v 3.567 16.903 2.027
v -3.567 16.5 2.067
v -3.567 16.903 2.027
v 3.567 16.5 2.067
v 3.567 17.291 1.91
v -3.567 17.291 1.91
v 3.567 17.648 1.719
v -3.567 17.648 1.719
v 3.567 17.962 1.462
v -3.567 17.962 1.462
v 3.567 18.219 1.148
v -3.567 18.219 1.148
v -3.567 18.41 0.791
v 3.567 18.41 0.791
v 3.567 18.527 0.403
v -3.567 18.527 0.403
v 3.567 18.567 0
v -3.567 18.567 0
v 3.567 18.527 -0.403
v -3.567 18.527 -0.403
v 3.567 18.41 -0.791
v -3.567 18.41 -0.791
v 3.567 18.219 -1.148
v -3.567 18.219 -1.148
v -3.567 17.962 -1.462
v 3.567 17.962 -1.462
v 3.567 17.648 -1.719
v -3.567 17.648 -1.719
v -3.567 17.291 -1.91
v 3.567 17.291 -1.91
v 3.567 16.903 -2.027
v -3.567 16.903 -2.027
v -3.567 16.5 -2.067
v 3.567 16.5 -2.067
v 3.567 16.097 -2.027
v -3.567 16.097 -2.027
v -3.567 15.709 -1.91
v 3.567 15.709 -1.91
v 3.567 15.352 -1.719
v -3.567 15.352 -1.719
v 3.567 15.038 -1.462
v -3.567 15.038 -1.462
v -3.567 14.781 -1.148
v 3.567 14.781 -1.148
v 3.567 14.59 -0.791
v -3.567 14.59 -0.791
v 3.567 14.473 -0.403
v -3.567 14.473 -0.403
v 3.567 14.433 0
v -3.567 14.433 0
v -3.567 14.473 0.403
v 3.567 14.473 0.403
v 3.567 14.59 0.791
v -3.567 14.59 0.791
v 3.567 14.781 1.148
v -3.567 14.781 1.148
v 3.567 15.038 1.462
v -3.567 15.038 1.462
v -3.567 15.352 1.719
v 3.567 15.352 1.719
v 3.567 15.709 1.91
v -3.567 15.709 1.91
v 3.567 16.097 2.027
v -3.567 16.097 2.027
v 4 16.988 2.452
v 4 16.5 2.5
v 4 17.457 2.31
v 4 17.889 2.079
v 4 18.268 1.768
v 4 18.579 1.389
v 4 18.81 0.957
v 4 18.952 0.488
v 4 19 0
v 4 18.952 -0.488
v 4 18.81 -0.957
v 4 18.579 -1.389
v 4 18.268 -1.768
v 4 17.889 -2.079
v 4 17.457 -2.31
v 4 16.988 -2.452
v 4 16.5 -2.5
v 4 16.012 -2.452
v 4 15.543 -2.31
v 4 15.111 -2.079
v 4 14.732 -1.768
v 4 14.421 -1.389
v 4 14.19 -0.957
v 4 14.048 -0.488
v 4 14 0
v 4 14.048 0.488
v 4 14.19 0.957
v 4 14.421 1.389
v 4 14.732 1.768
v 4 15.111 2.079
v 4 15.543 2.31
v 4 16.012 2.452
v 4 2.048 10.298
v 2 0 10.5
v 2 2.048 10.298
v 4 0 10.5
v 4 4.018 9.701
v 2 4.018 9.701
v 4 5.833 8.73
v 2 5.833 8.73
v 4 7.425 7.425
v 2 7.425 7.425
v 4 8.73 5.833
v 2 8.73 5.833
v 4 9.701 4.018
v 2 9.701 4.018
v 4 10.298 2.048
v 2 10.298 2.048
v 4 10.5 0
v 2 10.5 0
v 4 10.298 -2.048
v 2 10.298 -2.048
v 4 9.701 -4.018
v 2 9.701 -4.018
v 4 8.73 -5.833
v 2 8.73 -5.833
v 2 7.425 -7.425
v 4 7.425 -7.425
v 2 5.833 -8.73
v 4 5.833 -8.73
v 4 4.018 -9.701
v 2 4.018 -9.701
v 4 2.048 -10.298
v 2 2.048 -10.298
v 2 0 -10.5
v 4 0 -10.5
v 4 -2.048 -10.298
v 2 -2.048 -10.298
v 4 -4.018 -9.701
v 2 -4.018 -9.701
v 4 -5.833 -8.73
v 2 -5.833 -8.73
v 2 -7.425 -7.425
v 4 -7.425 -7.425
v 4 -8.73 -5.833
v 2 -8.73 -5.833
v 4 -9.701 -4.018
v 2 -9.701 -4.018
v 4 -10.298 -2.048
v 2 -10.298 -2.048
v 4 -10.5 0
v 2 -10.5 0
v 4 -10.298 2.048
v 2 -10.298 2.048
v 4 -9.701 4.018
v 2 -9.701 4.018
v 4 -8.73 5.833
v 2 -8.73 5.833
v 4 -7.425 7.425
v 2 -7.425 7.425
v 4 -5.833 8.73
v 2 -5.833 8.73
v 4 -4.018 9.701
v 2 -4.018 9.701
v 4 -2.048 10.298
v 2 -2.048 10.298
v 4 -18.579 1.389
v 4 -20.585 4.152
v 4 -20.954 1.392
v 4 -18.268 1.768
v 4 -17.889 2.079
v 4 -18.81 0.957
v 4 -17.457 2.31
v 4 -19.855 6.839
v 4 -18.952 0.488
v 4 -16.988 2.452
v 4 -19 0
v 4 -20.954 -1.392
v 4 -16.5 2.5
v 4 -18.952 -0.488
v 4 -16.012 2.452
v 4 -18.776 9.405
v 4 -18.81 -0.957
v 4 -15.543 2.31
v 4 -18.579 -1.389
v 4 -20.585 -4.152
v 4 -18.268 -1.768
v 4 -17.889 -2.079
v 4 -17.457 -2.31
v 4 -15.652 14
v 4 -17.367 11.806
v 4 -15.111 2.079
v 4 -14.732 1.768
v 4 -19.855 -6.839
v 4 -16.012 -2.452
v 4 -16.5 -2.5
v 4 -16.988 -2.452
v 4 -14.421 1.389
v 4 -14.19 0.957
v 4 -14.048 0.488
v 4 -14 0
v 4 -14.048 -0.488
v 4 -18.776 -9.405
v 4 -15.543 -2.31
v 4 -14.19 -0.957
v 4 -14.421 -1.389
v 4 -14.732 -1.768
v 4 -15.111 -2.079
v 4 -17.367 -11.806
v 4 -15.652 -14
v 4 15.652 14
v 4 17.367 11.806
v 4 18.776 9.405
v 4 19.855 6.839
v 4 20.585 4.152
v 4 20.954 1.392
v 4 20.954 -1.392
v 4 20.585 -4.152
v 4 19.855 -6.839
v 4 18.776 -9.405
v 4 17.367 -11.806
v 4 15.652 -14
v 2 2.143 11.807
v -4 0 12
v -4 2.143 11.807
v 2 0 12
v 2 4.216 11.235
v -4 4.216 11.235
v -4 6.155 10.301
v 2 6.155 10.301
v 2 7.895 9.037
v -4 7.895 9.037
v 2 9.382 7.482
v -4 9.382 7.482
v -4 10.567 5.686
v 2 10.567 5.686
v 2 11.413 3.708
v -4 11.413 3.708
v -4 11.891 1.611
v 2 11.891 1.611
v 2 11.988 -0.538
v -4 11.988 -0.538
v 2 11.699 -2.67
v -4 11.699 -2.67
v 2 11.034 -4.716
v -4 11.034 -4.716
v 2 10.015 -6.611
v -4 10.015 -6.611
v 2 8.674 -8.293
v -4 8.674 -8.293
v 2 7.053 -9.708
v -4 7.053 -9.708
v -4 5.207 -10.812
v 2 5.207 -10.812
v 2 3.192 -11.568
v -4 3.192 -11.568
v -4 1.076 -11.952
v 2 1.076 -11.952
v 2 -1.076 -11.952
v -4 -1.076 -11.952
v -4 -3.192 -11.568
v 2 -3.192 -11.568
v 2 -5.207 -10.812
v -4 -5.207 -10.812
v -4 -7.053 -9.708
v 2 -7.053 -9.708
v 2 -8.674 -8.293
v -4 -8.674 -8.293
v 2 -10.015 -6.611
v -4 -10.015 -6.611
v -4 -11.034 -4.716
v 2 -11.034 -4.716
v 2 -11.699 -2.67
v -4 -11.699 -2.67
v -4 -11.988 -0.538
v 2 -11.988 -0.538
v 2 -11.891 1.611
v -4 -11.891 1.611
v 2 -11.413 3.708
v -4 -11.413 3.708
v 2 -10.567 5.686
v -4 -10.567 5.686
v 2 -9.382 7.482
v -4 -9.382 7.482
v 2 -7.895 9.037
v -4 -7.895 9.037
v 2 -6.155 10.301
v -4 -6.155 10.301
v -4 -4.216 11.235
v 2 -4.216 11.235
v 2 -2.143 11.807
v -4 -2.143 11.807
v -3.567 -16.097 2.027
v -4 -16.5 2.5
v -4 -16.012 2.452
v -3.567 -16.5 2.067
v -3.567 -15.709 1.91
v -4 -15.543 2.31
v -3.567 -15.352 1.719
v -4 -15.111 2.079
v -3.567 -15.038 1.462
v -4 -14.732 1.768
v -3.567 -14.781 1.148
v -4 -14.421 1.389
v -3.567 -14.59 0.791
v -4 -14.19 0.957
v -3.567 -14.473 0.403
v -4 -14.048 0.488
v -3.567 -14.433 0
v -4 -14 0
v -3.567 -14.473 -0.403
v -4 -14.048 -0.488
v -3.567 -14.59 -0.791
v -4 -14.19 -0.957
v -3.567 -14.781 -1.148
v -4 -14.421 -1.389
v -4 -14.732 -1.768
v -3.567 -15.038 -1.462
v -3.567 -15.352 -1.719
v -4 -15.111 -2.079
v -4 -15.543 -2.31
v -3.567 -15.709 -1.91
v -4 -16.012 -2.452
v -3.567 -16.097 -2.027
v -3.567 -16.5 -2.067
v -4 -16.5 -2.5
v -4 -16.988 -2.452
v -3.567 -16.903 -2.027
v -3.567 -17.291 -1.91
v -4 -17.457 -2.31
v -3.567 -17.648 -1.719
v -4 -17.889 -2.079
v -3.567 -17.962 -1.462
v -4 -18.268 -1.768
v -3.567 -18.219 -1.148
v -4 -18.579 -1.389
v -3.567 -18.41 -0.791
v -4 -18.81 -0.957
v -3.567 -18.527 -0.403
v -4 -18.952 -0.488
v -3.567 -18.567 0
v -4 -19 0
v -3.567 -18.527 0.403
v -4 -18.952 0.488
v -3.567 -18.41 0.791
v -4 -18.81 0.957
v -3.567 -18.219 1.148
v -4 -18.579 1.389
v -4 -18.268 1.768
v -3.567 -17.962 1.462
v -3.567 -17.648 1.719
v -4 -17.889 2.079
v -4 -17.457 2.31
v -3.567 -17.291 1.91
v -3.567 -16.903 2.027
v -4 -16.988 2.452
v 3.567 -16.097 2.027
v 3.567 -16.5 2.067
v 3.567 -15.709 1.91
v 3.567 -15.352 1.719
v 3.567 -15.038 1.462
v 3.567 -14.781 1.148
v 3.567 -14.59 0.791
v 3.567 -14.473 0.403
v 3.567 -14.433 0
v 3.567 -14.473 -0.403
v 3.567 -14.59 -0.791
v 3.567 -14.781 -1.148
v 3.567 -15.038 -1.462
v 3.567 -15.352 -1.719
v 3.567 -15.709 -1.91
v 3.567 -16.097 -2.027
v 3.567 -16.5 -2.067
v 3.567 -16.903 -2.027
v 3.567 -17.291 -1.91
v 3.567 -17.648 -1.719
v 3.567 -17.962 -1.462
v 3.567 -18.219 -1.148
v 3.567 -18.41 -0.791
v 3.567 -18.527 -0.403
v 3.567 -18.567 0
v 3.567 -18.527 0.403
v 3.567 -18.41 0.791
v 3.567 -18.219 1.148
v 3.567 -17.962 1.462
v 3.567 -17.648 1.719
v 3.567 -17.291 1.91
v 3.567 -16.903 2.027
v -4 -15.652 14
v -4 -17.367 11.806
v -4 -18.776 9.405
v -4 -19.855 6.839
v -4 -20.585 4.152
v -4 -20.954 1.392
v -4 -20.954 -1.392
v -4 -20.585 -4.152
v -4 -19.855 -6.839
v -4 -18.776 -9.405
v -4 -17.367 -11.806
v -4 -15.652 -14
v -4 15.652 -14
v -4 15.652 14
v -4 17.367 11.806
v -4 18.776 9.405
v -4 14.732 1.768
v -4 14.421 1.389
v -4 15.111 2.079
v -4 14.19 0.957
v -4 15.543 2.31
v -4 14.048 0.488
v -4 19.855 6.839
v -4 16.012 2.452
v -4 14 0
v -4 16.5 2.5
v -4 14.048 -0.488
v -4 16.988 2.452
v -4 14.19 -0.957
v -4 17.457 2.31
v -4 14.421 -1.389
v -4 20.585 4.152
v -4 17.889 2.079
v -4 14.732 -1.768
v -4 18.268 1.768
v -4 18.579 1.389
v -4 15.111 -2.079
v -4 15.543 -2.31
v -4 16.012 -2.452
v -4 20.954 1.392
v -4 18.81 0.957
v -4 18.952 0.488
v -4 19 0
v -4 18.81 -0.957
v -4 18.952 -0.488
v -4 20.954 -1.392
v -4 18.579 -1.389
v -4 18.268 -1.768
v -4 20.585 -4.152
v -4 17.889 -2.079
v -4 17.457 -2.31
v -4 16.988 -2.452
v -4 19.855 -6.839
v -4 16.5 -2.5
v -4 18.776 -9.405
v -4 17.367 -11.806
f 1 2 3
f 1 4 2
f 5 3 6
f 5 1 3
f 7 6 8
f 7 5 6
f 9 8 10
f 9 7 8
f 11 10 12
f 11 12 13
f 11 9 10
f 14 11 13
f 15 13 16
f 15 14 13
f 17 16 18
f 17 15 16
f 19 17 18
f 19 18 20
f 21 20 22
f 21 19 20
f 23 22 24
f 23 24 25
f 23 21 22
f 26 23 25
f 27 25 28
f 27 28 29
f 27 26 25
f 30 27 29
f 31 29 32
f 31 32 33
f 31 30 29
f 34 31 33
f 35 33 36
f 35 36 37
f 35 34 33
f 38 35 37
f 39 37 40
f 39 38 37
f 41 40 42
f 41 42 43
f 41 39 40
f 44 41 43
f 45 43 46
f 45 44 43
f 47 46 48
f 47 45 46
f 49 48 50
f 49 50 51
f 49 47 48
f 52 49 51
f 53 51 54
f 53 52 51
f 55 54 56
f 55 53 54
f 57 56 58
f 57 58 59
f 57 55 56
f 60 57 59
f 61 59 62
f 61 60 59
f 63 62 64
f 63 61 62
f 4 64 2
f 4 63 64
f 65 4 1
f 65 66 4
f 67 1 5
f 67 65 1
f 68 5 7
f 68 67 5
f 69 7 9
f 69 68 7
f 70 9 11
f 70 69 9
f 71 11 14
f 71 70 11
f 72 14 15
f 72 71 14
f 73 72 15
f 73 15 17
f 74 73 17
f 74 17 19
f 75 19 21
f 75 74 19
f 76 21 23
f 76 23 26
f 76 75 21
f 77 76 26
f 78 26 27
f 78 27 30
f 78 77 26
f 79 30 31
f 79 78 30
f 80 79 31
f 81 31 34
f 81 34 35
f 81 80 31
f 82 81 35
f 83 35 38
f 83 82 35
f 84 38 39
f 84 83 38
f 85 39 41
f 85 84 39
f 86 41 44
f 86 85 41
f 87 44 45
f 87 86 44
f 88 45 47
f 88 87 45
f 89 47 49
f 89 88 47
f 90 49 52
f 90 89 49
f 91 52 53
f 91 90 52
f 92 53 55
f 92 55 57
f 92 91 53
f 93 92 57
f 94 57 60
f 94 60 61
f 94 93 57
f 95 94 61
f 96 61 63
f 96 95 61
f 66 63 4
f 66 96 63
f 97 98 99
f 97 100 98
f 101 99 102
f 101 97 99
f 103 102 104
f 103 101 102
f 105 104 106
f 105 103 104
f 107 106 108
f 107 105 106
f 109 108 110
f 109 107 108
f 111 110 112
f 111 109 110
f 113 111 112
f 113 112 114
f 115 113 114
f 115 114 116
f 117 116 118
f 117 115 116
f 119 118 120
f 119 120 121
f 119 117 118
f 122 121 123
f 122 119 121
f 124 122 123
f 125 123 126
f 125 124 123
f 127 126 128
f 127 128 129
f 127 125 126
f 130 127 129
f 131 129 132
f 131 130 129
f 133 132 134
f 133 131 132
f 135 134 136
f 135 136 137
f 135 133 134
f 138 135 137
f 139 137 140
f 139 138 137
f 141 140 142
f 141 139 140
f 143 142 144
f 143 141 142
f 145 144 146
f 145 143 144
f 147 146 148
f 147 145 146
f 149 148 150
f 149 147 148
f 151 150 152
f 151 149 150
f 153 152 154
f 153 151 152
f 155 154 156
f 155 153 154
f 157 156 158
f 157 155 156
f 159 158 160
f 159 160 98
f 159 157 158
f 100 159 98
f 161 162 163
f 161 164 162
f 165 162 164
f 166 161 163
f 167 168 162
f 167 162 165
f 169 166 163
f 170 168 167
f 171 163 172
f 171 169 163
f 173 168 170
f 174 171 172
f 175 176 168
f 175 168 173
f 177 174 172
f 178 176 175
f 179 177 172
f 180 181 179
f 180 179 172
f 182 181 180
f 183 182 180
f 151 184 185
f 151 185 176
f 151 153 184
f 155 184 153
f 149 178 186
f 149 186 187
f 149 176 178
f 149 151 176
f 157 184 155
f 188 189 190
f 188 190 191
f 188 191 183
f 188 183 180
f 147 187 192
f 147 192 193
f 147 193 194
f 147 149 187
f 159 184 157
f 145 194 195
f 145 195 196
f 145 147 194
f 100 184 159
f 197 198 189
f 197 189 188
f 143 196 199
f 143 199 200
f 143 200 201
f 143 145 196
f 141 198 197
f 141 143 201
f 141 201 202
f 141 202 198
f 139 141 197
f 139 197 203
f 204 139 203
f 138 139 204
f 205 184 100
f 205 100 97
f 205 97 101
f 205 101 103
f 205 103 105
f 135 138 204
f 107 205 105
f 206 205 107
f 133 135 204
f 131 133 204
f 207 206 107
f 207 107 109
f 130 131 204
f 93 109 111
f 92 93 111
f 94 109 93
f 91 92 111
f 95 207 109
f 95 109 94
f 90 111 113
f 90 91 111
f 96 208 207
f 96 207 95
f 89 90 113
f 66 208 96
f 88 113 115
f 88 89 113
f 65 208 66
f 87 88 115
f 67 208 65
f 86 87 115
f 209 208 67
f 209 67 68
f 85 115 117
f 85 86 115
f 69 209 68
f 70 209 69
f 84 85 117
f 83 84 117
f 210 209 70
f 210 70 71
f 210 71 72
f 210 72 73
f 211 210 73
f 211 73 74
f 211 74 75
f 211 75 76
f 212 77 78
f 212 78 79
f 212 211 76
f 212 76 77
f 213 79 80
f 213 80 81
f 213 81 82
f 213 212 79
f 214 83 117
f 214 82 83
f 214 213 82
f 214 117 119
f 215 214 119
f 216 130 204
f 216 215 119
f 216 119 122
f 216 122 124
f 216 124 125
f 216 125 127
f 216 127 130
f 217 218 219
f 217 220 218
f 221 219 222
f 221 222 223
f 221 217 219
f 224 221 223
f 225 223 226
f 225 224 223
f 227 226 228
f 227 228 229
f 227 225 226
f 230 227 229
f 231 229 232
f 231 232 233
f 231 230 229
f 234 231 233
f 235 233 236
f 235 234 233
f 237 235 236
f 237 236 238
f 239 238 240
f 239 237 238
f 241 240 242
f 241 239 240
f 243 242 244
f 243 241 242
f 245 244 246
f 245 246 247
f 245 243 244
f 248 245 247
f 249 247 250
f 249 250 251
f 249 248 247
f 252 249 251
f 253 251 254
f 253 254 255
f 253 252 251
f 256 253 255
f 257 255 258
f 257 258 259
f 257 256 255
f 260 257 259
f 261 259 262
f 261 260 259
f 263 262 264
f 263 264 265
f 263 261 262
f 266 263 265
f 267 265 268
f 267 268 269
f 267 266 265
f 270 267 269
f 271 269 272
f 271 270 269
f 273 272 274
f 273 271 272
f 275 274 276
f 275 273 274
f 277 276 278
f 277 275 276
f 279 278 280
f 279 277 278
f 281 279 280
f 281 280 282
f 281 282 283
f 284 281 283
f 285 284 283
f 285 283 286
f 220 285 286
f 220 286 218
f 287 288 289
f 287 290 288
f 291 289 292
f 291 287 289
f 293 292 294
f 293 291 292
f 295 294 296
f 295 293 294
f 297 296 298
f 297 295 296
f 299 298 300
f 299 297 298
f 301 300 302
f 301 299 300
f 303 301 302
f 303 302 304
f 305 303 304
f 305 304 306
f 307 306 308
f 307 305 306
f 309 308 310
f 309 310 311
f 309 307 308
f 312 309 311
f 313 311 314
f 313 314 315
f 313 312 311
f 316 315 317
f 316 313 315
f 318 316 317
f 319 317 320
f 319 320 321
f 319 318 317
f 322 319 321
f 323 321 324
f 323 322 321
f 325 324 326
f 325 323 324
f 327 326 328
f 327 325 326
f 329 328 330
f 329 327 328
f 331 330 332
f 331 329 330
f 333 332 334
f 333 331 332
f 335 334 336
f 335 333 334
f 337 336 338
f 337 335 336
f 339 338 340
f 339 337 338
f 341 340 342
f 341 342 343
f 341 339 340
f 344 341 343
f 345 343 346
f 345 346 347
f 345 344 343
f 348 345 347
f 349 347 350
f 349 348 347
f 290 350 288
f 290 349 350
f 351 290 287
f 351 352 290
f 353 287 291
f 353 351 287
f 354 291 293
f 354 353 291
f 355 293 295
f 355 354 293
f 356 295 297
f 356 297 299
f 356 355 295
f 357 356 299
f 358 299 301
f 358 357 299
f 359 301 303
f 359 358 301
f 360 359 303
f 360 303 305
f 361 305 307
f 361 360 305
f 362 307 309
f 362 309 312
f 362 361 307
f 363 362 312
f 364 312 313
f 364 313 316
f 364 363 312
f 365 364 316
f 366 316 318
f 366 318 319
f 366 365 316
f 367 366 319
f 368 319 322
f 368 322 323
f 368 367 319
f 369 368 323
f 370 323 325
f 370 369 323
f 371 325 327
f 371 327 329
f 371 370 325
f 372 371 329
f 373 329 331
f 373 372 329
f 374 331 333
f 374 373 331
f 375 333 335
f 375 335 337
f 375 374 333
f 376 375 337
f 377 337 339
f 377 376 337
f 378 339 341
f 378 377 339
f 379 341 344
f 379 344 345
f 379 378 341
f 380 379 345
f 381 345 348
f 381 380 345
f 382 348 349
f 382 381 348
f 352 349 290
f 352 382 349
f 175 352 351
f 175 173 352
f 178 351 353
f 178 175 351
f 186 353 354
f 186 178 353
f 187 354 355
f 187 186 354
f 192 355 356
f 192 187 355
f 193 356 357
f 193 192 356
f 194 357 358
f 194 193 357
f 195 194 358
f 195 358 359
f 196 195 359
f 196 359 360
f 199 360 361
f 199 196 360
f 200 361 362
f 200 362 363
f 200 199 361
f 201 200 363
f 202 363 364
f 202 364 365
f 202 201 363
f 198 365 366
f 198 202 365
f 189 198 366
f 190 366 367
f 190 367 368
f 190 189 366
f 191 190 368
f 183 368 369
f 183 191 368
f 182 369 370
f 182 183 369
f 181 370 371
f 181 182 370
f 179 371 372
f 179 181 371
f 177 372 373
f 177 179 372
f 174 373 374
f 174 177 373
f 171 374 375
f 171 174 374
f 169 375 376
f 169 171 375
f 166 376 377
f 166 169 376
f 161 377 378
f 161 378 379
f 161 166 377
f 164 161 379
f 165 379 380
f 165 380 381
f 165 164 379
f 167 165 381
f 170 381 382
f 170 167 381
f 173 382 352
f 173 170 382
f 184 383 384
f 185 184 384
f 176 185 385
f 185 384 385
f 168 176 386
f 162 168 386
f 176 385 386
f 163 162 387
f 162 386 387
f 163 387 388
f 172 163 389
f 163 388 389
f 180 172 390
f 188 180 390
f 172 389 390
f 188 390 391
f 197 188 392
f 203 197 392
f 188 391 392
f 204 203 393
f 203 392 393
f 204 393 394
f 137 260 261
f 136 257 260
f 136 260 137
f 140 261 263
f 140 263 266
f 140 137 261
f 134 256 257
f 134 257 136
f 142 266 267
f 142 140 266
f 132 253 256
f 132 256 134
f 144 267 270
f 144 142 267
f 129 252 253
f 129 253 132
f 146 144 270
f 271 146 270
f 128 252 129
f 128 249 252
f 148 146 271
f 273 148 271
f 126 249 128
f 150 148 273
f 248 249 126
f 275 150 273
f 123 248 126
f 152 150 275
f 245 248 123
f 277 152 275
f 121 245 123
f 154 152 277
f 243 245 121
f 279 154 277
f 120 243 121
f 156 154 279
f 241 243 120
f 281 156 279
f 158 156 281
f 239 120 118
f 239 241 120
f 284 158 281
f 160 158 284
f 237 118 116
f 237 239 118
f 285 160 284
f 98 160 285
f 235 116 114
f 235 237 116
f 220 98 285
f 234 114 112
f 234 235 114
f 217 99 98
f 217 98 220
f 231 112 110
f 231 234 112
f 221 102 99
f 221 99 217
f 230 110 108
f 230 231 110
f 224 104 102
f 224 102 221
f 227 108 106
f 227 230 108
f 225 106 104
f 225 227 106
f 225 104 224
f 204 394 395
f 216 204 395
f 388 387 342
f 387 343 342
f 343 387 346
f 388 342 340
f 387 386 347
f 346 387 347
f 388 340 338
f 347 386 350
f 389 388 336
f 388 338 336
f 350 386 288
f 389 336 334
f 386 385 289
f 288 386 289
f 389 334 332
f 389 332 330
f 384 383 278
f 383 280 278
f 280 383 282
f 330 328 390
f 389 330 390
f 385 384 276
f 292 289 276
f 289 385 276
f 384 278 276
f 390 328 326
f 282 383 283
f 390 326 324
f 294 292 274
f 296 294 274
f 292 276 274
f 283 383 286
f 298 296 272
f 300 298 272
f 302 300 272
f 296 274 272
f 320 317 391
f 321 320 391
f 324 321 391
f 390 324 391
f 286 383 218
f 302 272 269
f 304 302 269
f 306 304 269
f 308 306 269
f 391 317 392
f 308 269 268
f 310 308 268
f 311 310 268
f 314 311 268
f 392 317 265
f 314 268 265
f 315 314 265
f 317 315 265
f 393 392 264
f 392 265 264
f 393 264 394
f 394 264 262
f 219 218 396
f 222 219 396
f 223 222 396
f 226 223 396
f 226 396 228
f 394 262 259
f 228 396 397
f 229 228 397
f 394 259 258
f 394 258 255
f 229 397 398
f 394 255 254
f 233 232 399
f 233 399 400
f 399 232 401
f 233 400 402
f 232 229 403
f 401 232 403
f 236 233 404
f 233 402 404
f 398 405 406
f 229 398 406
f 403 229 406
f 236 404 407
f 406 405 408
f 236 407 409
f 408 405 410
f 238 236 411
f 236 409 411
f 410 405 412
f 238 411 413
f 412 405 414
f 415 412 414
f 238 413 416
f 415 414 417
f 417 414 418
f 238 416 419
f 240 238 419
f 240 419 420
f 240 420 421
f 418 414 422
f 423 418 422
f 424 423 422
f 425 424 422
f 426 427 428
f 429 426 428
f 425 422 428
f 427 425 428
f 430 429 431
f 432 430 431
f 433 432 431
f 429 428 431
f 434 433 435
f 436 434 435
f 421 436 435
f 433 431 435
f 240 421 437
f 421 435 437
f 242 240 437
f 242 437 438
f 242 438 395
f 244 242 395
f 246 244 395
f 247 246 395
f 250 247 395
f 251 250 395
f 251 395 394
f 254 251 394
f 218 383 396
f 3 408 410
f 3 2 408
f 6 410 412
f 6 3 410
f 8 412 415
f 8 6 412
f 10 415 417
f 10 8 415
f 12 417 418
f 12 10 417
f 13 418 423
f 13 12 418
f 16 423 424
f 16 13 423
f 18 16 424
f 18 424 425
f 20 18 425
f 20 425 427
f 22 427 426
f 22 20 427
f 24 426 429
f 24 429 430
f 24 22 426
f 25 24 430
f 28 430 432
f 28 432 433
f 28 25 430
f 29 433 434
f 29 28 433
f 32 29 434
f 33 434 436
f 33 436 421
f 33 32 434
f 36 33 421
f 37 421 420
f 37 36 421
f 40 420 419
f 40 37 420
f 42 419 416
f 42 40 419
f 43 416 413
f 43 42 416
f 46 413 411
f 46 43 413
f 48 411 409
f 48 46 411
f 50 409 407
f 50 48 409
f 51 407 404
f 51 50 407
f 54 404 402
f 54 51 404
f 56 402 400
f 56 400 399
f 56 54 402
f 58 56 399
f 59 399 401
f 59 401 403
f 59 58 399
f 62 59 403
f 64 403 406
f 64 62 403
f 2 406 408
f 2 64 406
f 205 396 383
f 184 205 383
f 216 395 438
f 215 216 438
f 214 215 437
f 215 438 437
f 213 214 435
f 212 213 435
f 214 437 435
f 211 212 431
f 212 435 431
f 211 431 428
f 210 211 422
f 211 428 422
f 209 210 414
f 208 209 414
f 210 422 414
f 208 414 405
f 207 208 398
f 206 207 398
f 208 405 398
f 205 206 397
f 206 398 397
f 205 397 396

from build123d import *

# Parameters (mm, degrees)
BOSS_EXTRUDE1_DEPTH      = 4
BOSS_EXTRUDE1_DEPTH_BACK = 4


with BuildPart() as part:
    # Sketch1 → Boss-Extrude1 (new, two sides: drawn at the far end of the back side and taken through both)
    with BuildSketch(Plane(origin=(0, 0, 0), x_dir=(0, 0, -1), z_dir=(1, 0, 0)).offset(-BOSS_EXTRUDE1_DEPTH_BACK)):
        with BuildLine():
            Line((14, -15.652475842), (14, 15.652475842))
            ThreePointArc((14, 15.652475842), (0, 21), (-14, 15.652475842))
            Line((-14, 15.652475842), (-14, -15.652475842))
            ThreePointArc((-14, -15.652475842), (0, -21), (14, -15.652475842))
        make_face()
    extrude(amount=BOSS_EXTRUDE1_DEPTH + BOSS_EXTRUDE1_DEPTH_BACK)

    # Sketch2 → Cut-Revolve1 (revolve, cut)
    with BuildSketch(Plane.XY):
        Polygon((-4, 0), (-4, 12), (2, 12), (2, 10.5), (4, 10.5), (4, 0), align=None)
    revolve(axis=Axis((4, 0, 0), (-1, 0, 0)), mode=Mode.SUBTRACT)

    # Sketch3 → Cut-Revolve2 (revolve, cut)
    with BuildSketch(Plane.XY):
        Polygon((-4, -16.5), (-4, -14), (-3.567, -14.433), (3.567, -14.433), (4, -14), (4, -16.5), align=None)
    revolve(axis=Axis((4, -16.5, 0), (-1, 0, 0)), mode=Mode.SUBTRACT)

    # Sketch4 → Cut-Revolve3 (revolve, cut)
    with BuildSketch(Plane.XY):
        Polygon((-4, 16.5), (-4, 19), (-3.567, 18.567), (3.567, 18.567), (4, 19), (4, 16.5), align=None)
    revolve(axis=Axis((4, 16.5, 0), (-1, 0, 0)), mode=Mode.SUBTRACT)


solid = part.part
